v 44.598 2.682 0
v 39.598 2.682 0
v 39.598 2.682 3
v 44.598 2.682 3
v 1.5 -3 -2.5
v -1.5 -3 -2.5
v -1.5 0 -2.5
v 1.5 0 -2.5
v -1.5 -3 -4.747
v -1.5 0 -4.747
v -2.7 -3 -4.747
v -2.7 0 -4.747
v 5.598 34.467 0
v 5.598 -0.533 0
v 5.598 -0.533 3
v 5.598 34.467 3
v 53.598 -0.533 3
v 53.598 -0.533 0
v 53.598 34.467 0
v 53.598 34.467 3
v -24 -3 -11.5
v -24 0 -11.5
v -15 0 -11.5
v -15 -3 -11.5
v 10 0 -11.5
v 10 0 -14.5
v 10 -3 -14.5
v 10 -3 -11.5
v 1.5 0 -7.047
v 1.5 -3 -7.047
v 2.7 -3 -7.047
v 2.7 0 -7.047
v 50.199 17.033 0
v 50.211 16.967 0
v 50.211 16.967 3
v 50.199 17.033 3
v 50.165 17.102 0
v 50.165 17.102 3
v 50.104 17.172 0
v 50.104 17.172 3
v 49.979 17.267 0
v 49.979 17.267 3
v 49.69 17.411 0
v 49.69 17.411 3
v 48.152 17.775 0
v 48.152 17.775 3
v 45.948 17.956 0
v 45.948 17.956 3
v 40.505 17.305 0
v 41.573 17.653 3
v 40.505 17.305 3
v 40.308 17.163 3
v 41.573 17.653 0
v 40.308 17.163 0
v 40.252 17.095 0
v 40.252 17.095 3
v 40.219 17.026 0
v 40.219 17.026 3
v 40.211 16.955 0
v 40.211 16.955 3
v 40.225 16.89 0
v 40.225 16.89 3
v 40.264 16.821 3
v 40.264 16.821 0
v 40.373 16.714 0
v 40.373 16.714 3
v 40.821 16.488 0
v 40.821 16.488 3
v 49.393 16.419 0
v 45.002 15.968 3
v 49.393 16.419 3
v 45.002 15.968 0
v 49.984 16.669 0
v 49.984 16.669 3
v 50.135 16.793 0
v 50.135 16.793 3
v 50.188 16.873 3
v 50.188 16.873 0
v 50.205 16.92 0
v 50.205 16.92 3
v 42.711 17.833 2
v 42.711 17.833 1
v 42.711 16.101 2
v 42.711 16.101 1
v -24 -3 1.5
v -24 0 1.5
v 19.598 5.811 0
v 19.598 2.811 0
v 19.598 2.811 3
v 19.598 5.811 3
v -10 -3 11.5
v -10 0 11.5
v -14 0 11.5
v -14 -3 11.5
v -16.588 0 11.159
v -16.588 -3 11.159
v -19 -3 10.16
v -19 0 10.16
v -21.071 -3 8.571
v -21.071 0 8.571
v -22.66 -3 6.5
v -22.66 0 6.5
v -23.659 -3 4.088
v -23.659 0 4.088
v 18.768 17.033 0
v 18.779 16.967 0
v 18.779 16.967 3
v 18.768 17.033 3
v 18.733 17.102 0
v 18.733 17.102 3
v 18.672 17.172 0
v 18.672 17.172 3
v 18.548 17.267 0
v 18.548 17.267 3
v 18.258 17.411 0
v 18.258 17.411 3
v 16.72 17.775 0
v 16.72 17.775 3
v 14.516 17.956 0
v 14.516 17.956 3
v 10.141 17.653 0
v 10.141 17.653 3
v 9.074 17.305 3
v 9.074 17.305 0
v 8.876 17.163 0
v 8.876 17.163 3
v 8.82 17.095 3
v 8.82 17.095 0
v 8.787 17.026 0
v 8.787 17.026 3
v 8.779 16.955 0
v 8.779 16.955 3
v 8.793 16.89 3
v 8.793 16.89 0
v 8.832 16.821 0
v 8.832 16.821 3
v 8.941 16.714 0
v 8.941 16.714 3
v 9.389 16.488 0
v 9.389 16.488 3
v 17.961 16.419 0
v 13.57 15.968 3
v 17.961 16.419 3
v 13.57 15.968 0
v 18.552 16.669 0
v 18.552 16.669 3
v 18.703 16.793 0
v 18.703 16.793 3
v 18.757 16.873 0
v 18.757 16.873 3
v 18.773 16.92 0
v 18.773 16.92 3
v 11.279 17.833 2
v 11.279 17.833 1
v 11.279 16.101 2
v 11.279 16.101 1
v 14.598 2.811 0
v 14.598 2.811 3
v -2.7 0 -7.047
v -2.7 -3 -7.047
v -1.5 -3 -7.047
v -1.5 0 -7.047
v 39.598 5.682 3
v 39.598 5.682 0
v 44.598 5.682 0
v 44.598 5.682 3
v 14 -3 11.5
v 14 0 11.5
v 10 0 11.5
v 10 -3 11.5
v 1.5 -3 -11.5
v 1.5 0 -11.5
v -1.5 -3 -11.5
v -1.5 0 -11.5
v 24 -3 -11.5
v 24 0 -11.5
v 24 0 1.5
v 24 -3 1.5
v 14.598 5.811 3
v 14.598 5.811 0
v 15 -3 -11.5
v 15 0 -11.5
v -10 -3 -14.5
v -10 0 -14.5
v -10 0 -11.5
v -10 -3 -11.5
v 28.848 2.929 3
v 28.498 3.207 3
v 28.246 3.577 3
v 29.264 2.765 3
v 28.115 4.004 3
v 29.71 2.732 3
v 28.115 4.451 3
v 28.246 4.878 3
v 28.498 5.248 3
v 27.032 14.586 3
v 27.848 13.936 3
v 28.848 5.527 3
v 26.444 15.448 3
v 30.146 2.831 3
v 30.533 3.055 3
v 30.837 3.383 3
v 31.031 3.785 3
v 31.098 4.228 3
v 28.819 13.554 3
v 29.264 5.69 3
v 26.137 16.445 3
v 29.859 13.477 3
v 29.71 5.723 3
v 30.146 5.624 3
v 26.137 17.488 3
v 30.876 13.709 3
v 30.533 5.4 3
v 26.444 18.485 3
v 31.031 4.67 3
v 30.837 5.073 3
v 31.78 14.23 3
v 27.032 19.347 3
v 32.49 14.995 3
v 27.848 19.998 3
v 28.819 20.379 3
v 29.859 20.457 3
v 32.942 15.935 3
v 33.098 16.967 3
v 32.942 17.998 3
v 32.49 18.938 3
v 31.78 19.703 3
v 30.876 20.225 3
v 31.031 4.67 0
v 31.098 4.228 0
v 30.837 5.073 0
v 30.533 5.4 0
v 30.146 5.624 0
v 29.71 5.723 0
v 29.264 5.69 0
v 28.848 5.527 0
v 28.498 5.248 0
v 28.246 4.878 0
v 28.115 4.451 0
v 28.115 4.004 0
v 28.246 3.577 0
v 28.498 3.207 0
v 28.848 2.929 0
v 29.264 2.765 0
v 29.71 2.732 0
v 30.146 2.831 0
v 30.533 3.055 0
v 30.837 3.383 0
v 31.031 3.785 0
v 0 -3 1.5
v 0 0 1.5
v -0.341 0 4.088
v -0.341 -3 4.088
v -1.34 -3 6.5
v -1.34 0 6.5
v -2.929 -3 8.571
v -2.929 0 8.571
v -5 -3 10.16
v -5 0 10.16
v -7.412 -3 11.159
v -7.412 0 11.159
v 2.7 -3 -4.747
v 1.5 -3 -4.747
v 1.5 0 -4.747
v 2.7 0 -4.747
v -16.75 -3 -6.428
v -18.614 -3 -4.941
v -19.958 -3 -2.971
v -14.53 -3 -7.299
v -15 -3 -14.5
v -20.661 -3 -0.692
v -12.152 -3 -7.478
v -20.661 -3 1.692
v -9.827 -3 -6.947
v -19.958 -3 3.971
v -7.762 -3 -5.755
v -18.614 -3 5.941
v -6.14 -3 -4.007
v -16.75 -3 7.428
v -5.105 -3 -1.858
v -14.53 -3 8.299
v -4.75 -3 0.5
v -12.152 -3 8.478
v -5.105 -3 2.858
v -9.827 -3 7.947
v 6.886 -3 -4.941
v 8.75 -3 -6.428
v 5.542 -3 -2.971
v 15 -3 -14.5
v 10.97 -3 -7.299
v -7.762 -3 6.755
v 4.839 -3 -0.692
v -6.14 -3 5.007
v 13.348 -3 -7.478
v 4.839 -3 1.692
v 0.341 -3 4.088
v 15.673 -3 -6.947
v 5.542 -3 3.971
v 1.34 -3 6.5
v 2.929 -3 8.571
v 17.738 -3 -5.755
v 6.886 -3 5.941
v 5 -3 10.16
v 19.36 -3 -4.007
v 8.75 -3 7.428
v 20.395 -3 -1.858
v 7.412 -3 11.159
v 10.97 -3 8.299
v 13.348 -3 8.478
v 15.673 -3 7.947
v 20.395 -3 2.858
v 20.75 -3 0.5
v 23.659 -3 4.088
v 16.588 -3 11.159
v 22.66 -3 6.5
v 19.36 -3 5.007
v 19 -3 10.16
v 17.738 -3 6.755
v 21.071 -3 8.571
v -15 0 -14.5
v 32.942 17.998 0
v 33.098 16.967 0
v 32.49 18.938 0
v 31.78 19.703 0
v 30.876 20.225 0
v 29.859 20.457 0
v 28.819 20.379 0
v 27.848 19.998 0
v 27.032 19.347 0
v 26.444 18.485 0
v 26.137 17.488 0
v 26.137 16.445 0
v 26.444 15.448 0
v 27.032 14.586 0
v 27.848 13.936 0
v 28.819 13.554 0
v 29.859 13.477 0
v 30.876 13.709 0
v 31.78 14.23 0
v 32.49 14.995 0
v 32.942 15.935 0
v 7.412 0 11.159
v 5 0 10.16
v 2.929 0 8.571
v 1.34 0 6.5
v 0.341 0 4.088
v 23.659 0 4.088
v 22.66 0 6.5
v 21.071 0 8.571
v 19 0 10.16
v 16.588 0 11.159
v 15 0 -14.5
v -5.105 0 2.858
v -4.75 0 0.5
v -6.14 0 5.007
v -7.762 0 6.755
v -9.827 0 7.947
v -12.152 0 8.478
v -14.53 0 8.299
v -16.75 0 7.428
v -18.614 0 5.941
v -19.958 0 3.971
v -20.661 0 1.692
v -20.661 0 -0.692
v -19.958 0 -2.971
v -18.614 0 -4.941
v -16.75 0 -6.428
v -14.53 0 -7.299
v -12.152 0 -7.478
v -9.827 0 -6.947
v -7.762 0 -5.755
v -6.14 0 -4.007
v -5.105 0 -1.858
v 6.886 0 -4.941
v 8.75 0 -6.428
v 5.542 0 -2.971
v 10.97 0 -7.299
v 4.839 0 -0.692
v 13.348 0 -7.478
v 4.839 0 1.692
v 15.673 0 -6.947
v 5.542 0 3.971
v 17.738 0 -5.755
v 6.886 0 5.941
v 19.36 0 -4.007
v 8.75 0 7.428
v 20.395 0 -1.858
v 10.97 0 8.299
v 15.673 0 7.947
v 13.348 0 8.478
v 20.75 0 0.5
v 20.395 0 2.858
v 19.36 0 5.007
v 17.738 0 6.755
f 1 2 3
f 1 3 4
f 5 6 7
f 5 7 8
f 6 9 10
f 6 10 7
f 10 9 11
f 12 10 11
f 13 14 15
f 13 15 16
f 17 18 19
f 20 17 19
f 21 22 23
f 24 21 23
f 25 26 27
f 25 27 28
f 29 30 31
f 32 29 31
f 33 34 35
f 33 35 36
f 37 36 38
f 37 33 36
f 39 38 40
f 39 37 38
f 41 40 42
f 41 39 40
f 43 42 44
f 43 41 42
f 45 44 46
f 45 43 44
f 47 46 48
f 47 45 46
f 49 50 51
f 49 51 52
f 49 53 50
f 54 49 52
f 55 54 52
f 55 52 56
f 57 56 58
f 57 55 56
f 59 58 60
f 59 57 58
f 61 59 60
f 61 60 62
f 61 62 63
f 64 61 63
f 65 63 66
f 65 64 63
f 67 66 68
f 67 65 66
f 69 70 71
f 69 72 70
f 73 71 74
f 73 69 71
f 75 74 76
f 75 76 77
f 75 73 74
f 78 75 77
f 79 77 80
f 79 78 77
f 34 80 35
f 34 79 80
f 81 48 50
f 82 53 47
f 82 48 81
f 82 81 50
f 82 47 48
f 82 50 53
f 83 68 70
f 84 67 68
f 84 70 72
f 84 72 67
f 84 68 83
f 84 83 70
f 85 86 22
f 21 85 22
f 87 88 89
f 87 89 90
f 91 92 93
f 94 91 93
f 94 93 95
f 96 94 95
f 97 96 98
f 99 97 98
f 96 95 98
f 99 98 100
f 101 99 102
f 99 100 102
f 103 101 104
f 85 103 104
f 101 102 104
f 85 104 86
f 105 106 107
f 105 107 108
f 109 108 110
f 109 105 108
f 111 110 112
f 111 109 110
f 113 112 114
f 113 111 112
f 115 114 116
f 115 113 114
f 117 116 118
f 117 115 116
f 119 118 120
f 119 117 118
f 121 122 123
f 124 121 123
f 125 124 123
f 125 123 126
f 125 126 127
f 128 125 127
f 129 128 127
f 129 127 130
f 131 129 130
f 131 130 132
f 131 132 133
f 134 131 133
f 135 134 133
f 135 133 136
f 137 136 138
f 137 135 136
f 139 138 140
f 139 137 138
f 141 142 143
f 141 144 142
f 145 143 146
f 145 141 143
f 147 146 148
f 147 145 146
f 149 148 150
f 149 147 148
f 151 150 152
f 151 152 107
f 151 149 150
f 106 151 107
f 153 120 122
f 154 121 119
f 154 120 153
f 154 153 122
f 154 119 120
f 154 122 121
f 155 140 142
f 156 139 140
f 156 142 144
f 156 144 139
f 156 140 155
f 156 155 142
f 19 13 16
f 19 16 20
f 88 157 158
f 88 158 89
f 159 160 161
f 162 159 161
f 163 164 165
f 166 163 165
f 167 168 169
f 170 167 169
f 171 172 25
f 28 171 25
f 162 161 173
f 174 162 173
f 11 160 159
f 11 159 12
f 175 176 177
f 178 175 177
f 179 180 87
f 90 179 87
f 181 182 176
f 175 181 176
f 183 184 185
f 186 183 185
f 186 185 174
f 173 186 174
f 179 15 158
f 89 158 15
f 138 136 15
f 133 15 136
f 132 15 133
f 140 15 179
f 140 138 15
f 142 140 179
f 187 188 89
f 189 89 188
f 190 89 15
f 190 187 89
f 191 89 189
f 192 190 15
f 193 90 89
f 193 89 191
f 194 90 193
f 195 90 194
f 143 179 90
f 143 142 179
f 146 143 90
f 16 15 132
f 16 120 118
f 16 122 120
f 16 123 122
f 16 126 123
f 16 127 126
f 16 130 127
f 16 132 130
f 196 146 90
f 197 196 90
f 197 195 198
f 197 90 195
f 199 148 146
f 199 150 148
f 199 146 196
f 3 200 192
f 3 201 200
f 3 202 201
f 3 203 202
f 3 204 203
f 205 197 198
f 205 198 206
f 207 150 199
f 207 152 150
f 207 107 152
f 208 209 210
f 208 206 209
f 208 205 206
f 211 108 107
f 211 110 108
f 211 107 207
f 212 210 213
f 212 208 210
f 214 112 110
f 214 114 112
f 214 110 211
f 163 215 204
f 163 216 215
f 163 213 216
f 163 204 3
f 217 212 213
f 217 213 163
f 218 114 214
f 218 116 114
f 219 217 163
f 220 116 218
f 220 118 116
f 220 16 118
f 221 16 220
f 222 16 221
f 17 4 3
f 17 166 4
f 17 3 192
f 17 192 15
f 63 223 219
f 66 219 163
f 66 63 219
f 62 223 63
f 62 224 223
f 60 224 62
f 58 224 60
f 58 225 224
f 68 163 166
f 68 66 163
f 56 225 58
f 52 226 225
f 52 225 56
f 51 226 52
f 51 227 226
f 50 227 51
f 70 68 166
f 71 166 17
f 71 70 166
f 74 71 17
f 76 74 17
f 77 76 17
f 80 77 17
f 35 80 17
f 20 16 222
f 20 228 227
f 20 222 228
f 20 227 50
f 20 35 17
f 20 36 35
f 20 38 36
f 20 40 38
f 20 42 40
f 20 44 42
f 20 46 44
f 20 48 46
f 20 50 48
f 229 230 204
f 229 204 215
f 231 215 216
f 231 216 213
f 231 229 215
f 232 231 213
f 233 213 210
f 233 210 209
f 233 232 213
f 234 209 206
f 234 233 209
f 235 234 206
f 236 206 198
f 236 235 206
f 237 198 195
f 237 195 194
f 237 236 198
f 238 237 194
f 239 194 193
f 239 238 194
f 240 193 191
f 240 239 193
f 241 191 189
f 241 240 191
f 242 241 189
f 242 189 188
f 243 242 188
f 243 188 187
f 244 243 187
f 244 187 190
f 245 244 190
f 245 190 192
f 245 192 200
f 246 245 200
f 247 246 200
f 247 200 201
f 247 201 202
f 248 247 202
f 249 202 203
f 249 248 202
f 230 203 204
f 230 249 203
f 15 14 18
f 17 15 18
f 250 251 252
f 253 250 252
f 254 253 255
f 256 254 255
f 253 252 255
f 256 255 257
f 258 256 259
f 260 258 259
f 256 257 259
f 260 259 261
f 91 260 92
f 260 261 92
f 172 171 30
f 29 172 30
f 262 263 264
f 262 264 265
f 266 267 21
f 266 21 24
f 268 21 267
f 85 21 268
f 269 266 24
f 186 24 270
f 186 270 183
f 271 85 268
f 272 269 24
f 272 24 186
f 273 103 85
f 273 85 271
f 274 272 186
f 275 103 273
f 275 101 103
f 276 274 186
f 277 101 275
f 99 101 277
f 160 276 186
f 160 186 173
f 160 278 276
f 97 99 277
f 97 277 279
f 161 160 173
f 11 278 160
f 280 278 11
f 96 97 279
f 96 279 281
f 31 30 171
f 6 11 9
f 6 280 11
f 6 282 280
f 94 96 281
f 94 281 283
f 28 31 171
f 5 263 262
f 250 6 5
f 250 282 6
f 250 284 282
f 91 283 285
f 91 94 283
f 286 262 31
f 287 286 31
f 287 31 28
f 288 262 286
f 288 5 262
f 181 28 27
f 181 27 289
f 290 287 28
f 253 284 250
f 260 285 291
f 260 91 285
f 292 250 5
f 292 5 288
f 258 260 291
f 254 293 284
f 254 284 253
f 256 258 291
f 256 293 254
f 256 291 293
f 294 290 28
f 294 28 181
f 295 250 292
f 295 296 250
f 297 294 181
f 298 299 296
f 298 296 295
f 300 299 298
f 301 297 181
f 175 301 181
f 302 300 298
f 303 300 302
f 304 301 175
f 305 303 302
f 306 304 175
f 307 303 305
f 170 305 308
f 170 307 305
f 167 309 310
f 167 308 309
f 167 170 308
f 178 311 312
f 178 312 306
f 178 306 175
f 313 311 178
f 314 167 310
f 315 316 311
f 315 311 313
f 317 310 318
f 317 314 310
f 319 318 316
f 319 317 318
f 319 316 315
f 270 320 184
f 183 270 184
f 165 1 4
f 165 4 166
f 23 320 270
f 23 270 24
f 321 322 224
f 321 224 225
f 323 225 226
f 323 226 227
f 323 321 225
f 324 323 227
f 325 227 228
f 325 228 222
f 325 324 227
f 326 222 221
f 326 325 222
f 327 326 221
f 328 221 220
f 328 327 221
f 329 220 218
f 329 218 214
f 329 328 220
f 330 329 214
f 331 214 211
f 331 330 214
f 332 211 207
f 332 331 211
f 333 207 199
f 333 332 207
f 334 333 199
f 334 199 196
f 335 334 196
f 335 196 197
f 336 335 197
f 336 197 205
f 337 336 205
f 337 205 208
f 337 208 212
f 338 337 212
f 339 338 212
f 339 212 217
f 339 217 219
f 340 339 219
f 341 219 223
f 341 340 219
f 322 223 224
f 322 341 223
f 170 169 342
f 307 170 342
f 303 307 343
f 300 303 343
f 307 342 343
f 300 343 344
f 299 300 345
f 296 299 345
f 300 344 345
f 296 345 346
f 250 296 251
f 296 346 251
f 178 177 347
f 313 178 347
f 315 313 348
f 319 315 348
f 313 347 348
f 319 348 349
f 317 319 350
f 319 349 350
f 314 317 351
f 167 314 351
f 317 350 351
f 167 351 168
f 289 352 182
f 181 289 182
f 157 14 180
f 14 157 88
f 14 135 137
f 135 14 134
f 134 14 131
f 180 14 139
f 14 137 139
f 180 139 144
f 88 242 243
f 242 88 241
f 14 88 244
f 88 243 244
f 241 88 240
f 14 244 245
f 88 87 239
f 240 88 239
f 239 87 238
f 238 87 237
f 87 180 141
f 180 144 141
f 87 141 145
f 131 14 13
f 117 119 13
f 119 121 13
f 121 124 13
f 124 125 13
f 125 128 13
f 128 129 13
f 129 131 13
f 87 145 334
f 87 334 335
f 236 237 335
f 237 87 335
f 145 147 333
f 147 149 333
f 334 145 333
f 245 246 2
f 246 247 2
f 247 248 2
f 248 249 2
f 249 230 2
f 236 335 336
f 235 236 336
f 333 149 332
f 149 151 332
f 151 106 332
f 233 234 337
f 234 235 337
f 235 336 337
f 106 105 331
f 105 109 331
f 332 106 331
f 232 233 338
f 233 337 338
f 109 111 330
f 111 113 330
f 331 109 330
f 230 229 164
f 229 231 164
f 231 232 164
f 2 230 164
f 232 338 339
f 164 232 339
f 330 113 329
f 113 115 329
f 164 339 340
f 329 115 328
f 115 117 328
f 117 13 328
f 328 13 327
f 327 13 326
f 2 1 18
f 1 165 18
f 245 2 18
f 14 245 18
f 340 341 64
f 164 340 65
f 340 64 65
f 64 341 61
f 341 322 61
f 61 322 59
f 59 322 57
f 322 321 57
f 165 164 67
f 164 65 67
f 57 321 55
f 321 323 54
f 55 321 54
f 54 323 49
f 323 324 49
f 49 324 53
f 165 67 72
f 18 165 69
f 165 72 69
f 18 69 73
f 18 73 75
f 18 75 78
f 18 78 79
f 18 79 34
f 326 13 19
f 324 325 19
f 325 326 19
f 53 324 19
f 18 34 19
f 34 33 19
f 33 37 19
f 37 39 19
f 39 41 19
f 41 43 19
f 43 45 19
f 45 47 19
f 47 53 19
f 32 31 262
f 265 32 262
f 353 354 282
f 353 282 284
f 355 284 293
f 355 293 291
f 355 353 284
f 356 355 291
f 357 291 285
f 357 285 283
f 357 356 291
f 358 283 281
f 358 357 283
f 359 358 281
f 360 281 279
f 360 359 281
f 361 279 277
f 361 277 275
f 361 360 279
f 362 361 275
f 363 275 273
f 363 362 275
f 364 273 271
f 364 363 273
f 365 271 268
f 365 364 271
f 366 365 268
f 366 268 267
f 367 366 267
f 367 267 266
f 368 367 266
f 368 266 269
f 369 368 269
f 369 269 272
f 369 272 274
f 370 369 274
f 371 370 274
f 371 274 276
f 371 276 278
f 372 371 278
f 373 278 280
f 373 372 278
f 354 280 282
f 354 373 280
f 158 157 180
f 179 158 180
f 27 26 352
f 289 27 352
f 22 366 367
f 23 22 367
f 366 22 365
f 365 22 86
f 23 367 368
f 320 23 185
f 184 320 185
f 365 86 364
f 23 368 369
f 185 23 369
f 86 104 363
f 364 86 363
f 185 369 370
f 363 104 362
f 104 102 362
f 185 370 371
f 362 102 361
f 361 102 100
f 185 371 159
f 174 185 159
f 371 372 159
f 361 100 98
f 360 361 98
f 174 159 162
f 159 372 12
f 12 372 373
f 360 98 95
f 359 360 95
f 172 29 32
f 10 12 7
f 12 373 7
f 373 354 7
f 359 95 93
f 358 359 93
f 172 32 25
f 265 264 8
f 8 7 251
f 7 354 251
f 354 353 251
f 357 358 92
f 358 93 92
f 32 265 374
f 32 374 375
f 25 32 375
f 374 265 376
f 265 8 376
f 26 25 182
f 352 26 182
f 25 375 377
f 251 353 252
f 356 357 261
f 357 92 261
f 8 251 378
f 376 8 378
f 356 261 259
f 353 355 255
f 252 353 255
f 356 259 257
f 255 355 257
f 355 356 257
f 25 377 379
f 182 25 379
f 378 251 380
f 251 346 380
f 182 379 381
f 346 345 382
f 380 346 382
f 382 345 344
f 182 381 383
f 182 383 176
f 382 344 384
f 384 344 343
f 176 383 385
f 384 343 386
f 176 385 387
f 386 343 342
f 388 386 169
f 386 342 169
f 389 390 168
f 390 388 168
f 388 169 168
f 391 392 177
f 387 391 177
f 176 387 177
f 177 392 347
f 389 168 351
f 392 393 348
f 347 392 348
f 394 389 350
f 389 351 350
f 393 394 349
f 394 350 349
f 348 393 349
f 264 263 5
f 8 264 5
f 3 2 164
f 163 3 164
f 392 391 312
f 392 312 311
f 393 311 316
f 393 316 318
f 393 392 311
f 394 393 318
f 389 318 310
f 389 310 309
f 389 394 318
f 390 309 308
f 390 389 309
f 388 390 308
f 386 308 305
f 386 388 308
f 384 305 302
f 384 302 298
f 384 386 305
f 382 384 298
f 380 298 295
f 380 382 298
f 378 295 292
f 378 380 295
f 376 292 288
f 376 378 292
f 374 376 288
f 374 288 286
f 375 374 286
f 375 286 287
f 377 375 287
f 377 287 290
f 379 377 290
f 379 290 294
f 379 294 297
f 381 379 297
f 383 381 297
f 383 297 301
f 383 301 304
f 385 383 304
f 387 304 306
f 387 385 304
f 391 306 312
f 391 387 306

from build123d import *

# Parameters (mm, degrees)
F1_W     = 48
F1_H     = 35
F1_W_2   = 5
F1_H_2   = 3
F1_R     = 1.5
F1_R_2   = 3.5
F2_DEPTH = 3
F0_R     = 8
F0_W     = 5
F0_H     = 3
F3_DEPTH = 3
F4_W     = 3
F4_H     = 4.4525395855
F4_H_2   = 2.3
F4_W_2   = 1.2
F4_H_3   = 2.2474604145
F5_DEPTH = 25


with BuildPart() as f2:
    # F1 (on Top) → F2 (new body)
    with BuildSketch(Plane.XY):
        with Locations((29.5977953598, 16.9667163237)):
            Rectangle(F1_W, F1_H)
        with Locations((17.0977953598, 4.3105331585)):
            Rectangle(F1_W_2, F1_H_2, mode=Mode.SUBTRACT)
        with Locations((29.5977953598, 4.2276201937)):
            Circle(F1_R, mode=Mode.SUBTRACT)
        with BuildLine():
            add(Edge.make_bspline(
                [(18.7787204309, 16.9667163237), (18.7787204309, 18.6987671312), (11.2787204309, 17.8327417275), (3.7787204309, 16.9667163237), (11.2787204309, 16.1006909199), (18.7787204309, 15.2346655161), (18.7787204309, 16.9667163237)],
                knots=[0, 0, 0, 2.0943951024, 2.0943951024, 4.1887902048, 4.1887902048, 6.2831853072, 6.2831853072, 6.2831853072], degree=2, weights=[1, 0.5, 1, 0.5, 1, 0.5, 1]))
        make_face(mode=Mode.SUBTRACT)
        with Locations((42.0977953598, 4.1822276413)):
            Rectangle(F1_W_2, F1_H_2, mode=Mode.SUBTRACT)
        with Locations((29.5977953598, 16.9667163237)):
            Circle(F1_R_2, mode=Mode.SUBTRACT)
        with BuildLine():
            add(Edge.make_bspline(
                [(50.2105216682, 16.9667163237), (50.2105216682, 18.6987671312), (42.7105216682, 17.8327417275), (35.2105216682, 16.9667163237), (42.7105216682, 16.1006909199), (50.2105216682, 15.2346655161), (50.2105216682, 16.9667163237)],
                knots=[0, 0, 0, 2.0943951024, 2.0943951024, 4.1887902048, 4.1887902048, 6.2831853072, 6.2831853072, 6.2831853072], degree=2, weights=[1, 0.5, 1, 0.5, 1, 0.5, 1]))
        make_face(mode=Mode.SUBTRACT)
    extrude(amount=F2_DEPTH)


with BuildPart() as f3:
    # F0 (on Front) → F3 (new body)
    with BuildSketch(Plane.XZ):
        with BuildLine():
            Line((-10, 11.5), (-14, 11.5))
            ThreePointArc((-14, 11.5), (-21.0710678119, 8.5710678119), (-24, 1.5))
            Line((-24, 1.5), (-24, -11.5))
            Line((-24, -11.5), (-15, -11.5))
            Line((-15, -11.5), (-10, -11.5))
            Line((-10, -11.5), (10, -11.5))
            Line((10, -11.5), (15, -11.5))
            Line((15, -11.5), (24, -11.5))
            Line((24, -11.5), (24, 1.5))
            ThreePointArc((24, 1.5), (21.0710678119, 8.5710678119), (14, 11.5))
            Line((14, 11.5), (10, 11.5))
            ThreePointArc((10, 11.5), (2.9289321881, 8.5710678119), (0, 1.5))
            ThreePointArc((0, 1.5), (-2.9289321881, 8.5710678119), (-10, 11.5))
        make_face()
        with Locations((-12.75, 0.5)):
            Circle(F0_R, mode=Mode.SUBTRACT)
        with Locations((12.75, 0.5)):
            Circle(F0_R, mode=Mode.SUBTRACT)
        with Locations((-12.5, -13)):
            Rectangle(F0_W, F0_H)
        with Locations((12.5, -13)):
            Rectangle(F0_W, F0_H)
    extrude(amount=F3_DEPTH)

    # F4 (on face) → F5 (cut)
    with BuildSketch(Plane.XZ.offset(3)):
        with Locations((0, -9.2737302072)):
            Rectangle(F4_W, F4_H)
        with Locations((0, -5.8974604145)):
            Rectangle(F4_W, F4_H_2)
        with Locations((-2.1, -5.8974604145)):
            Rectangle(F4_W_2, F4_H_2)
        with Locations((0, -3.6237302072)):
            Rectangle(F4_W, F4_H_3)
        with Locations((2.1, -5.8974604145)):
            Rectangle(F4_W_2, F4_H_2)
    extrude(amount=-F5_DEPTH, mode=Mode.SUBTRACT)


solid = Compound([f2.part, f3.part])
